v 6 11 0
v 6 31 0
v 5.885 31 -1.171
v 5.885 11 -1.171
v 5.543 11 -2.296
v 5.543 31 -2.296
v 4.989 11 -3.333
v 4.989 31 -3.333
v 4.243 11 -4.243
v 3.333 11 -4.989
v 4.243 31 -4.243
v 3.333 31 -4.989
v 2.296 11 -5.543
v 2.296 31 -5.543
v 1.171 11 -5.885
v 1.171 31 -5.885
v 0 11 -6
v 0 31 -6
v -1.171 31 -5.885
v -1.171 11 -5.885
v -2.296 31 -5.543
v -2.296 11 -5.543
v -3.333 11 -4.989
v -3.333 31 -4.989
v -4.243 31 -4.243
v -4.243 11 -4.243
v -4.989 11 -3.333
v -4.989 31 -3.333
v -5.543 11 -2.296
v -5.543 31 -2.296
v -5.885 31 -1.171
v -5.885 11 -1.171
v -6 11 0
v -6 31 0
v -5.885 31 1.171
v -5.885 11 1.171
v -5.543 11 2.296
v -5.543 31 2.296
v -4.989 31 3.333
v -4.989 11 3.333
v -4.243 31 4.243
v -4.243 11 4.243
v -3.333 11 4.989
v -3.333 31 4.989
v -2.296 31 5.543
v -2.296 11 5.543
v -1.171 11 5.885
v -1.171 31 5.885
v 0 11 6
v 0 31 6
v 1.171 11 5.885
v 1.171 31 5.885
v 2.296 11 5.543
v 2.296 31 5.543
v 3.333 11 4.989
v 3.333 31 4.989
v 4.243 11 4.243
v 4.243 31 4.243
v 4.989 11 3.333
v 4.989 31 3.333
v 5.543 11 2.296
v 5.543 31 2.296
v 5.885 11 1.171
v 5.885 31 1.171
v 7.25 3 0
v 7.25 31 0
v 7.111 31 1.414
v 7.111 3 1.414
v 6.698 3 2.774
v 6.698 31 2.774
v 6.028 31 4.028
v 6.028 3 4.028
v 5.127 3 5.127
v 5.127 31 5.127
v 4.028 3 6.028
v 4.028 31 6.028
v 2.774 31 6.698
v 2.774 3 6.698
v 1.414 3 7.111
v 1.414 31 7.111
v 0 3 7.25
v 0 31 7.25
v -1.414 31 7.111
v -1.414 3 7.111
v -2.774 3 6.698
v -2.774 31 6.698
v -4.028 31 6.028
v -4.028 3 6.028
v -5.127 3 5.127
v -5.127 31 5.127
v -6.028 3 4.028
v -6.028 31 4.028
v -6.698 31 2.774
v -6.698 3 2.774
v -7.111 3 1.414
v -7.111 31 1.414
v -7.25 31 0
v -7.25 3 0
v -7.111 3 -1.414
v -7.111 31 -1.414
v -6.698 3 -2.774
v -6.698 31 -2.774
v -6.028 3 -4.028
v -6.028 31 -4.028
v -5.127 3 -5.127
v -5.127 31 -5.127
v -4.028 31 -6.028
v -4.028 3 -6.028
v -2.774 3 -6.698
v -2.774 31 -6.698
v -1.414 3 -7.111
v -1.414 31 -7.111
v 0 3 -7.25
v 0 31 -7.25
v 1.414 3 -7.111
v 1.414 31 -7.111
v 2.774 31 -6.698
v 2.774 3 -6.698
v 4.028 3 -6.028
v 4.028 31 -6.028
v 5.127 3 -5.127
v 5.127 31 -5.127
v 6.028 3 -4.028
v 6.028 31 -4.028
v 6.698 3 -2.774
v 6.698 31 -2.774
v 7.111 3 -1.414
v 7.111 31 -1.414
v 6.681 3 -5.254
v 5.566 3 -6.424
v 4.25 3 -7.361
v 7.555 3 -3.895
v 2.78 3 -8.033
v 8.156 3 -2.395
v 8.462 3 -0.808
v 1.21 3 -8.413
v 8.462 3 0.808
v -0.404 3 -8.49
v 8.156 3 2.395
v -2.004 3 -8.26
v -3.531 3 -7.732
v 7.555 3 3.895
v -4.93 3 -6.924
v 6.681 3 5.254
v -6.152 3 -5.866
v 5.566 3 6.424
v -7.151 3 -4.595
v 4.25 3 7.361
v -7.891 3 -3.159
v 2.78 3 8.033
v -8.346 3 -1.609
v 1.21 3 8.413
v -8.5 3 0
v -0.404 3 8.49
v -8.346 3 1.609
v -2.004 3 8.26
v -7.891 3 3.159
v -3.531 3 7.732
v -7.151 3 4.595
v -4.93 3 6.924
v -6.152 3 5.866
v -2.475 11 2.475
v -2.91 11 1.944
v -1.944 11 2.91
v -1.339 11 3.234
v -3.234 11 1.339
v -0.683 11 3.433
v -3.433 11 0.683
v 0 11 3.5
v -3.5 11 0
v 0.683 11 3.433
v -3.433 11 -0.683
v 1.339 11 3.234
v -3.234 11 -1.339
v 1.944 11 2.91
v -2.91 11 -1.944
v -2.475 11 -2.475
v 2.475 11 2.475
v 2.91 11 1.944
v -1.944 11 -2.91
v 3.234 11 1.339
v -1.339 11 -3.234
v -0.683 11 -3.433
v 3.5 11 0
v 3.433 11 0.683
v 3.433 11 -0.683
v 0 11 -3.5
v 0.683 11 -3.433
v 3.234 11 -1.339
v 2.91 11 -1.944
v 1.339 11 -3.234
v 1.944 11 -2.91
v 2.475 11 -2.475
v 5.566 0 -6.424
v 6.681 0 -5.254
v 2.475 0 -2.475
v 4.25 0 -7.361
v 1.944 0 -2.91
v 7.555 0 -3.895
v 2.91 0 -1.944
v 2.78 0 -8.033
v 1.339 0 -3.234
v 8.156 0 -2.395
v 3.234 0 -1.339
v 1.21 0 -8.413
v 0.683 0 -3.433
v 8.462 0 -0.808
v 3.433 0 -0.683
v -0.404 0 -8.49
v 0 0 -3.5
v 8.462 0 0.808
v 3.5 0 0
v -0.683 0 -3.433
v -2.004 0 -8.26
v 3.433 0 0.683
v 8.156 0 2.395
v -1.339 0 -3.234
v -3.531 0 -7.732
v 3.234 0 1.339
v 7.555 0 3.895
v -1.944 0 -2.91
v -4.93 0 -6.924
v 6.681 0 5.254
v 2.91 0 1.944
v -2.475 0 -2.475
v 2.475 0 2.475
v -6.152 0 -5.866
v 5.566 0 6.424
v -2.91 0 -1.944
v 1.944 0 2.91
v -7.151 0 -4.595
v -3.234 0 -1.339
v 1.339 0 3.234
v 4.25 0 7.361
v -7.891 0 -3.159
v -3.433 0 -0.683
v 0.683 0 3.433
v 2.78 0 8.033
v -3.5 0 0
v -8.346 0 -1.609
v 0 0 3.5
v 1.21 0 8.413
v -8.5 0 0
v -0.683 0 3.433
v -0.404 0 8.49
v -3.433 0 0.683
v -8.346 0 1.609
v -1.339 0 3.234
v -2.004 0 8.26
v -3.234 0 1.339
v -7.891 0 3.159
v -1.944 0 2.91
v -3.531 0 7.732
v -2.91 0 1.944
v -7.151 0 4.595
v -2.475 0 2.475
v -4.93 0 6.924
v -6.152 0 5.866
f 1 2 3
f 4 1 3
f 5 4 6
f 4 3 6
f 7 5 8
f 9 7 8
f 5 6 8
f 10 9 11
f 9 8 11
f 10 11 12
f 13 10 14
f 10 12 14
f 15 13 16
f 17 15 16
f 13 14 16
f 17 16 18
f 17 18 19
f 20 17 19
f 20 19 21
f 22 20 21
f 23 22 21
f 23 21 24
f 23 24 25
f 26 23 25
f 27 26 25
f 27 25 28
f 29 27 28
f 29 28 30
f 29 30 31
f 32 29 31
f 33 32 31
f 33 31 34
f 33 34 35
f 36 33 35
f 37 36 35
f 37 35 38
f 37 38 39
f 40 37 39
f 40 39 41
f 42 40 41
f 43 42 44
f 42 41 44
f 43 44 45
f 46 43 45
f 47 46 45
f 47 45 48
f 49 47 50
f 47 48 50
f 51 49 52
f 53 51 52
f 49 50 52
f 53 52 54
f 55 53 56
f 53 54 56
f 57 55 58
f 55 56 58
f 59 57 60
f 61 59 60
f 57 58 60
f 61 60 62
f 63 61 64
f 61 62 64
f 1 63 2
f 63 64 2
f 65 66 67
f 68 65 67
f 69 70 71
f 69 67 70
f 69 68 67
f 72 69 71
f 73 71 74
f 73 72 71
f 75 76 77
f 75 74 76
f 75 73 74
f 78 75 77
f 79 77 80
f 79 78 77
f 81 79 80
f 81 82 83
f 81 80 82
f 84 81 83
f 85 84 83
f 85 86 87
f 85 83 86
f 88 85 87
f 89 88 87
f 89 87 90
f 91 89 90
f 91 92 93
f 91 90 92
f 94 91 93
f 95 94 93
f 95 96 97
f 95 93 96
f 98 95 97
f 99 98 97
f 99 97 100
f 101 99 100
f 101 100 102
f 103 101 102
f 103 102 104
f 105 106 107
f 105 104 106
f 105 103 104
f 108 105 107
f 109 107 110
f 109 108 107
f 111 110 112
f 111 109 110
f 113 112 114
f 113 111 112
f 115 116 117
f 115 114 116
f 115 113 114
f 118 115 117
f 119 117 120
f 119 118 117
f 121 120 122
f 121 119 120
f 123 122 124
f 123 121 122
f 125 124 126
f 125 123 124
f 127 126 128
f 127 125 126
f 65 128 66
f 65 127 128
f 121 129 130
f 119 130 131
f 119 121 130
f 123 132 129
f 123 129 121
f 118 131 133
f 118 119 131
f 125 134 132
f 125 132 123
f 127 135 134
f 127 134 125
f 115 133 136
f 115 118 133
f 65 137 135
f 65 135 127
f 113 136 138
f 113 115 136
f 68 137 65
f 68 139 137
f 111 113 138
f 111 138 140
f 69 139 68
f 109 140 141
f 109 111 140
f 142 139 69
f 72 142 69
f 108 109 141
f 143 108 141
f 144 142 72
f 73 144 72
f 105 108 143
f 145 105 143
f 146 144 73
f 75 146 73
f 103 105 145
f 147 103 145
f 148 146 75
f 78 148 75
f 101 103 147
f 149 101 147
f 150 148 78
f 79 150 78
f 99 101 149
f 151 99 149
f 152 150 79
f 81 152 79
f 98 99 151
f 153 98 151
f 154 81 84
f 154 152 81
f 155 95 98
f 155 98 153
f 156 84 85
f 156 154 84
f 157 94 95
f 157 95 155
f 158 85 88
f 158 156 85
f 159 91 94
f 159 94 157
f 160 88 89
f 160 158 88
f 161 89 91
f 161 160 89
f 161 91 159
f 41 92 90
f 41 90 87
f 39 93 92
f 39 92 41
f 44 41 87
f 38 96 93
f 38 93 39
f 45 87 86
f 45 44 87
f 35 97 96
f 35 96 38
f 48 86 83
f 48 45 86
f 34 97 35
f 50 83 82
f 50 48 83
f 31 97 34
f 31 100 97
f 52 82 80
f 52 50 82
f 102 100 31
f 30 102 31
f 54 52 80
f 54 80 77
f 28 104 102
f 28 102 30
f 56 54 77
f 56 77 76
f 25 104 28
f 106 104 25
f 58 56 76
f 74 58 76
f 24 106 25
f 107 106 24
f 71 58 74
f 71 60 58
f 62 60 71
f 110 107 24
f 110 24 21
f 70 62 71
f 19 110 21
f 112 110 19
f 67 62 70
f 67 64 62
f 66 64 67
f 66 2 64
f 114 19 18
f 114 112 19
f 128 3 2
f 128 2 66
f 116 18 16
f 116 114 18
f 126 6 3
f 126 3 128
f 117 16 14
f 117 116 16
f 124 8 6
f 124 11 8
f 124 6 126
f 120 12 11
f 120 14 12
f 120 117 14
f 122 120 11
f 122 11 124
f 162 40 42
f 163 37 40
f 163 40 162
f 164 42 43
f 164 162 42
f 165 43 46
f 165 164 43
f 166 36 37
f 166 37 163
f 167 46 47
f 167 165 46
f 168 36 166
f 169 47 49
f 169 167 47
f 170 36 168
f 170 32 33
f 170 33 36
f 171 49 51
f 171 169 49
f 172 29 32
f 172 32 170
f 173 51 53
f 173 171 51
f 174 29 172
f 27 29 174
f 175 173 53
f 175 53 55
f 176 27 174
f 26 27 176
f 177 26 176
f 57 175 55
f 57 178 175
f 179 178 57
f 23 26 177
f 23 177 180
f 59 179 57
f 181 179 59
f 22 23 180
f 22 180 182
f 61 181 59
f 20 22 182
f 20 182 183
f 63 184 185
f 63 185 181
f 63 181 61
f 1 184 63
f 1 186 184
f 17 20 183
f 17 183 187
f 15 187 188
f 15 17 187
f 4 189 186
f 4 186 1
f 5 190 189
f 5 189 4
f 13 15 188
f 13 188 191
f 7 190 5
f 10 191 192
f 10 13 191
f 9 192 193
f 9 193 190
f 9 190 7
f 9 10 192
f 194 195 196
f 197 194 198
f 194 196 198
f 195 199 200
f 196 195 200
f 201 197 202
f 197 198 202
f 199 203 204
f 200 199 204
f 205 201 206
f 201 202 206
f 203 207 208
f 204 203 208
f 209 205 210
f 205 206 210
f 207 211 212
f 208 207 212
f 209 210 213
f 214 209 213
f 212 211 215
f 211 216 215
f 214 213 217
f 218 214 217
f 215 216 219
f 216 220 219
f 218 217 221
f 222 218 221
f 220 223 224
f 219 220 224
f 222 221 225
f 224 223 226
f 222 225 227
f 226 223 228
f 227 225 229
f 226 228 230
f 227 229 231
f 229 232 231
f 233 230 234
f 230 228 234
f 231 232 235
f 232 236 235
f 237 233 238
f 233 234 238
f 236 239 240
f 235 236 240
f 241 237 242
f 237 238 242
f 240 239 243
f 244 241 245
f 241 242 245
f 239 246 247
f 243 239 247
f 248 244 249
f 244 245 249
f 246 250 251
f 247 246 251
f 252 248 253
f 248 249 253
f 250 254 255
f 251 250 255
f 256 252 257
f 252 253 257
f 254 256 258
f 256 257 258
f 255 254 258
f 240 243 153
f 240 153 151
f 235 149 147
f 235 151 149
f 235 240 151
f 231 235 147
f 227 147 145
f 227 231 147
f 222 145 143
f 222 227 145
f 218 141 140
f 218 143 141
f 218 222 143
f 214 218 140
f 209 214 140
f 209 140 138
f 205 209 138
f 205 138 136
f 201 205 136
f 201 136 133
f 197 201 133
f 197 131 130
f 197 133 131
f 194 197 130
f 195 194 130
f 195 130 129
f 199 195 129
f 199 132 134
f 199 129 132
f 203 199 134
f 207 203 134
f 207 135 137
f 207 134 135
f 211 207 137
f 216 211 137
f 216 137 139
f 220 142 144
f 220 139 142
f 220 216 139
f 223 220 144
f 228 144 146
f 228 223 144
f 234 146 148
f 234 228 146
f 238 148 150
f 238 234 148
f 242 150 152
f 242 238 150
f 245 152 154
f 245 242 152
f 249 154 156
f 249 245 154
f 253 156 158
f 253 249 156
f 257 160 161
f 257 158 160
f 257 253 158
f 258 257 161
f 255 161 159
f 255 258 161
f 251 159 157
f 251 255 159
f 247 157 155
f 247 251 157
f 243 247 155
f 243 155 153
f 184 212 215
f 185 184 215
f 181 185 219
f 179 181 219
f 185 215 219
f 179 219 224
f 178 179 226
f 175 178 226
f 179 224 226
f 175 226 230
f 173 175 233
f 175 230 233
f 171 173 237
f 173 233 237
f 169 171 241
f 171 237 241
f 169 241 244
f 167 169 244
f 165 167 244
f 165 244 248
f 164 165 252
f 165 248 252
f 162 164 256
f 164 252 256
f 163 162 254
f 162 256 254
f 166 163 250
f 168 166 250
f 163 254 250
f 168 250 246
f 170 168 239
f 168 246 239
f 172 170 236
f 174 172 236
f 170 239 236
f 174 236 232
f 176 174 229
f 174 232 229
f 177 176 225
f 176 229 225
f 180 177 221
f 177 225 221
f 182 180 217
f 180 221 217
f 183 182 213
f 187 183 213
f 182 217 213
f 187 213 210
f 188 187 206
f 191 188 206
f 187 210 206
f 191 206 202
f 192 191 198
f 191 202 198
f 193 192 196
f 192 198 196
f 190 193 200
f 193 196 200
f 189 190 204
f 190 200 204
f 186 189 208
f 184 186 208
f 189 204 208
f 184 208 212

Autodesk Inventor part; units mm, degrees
ref_plane "YZ Plane" through (0, 0, 0) normal (1, 0, 0) x (0, 1, 0)
ref_plane "XZ Plane" through (0, 0, 0) normal (0, 1, 0) x (-1, 0, 0)
ref_plane "XY Plane" through (0, 0, 0) normal (0, 0, 1) x (1, 0, 0)
sketch "Sketch1" plane through (0, 0, 0) normal (0, 1, 0) x (-1, 0, 0)
  circle A0 centre (0, 0) radius 8.5
  dimension "d0" = 17
extrude "Extrusion1" add sketch "Sketch1" along normal blind 3
sketch "Sketch2" plane through (0, 3, 0) normal (0, 1, 0) x (1, 0, 0)
  circle A0 centre (0, 0) radius 7.25
  dimension "d3" = 14.5
extrude "Extrusion2" add sketch "Sketch2" along normal blind 28
sketch "Sketch3" plane through (0, 31, 0) normal (0, 1, 0) x (1, 0, 0)
  circle A0 centre (0, 0) radius 6
  dimension "d6" = 12
extrude "Extrusion3" cut sketch "Sketch3" against normal blind 20
sketch "Sketch4" plane through (0, 0, 0) normal (0, -1, 0) x (1, 0, 0)
  circle A0 centre (0, 0) radius 3.5
  dimension "d10" = 7
extrude "Extrusion4" cut sketch "Sketch4" against normal blind 30.25
sketch "Sketch5" plane through (0, 31, 0) normal (0, 1, 0) x (1, 0, 0)
  point P0 (0, 0)
equation "\"BendRadius\" = Thickness"
equation "\"BendReliefWidth\" = Thickness"
equation "\"BendReliefDepth\" = 0.5 * Thickness"
equation "\"CornerReliefSize\" = 4 * Thickness"
equation "\"MinimumRemnant\" = 2 * Thickness"
equation "\"TransitionRadius\" = BendRadius"
equation "\"JacobiRadiusSize\" = BendRadius"
equation "\"GapSize\" = Thickness"
equation "\"Thickness\" = 0.5"
properties part number "Tornillo Caja 1"
